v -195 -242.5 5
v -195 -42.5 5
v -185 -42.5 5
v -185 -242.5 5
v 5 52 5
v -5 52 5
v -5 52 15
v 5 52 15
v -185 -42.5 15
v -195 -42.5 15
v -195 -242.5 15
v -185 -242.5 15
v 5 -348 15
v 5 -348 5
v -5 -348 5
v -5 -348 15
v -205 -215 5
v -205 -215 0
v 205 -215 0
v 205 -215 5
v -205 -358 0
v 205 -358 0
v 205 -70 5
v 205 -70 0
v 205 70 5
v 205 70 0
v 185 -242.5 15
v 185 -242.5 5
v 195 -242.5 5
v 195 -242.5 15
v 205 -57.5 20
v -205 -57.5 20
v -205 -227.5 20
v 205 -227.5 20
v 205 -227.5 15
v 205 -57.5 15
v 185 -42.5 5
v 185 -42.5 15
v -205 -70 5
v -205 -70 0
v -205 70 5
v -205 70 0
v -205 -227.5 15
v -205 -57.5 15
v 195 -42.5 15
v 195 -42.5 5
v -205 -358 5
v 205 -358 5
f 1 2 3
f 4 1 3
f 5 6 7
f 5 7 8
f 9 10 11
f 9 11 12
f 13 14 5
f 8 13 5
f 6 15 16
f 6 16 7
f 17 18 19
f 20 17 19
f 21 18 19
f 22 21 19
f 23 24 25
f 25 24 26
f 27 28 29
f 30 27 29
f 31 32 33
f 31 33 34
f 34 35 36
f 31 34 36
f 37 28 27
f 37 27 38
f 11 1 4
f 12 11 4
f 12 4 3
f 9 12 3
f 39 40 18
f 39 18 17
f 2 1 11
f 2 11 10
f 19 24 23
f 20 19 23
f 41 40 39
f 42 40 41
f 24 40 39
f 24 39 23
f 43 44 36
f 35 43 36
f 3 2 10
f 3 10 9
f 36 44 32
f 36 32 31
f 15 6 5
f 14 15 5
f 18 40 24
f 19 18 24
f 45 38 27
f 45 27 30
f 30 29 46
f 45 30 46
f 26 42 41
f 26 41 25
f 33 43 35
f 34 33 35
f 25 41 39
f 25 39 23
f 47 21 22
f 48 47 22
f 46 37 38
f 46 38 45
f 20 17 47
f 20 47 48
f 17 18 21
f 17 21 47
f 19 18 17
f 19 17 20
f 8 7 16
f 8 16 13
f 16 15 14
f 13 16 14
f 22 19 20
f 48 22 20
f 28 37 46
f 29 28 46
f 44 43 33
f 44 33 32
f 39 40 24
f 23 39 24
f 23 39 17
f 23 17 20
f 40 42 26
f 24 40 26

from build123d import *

# Parameters (mm, degrees)
F0_W     = 410
F0_H     = 140
F1_DEPTH = 5
F2_DEPTH = 145
F3_DEPTH = 143
F4_W     = 10
F4_H     = 400
F5_DEPTH = 10
F4_H_2   = 200
F6_W     = 410
F6_H     = 170
F7_DEPTH = 5


with BuildPart() as f1:
    # F0 (on Top) → F1 (new body)
    with BuildSketch(Plane.XY):
        Rectangle(F0_W, F0_H)
    extrude(amount=F1_DEPTH)


with BuildPart() as f2:
    # F2 (new): a face of the model
    f2_faces = [f1.part.faces().sort_by_distance(p)[0] for p in [
        (0, -70, 2.5),
    ]]
    extrude(f2_faces, amount=F2_DEPTH)


with BuildPart() as f3:
    # F3 (new): a face of the model
    f3_faces = [f2.part.faces().sort_by_distance(p)[0] for p in [
        (0, -215, 2.5),
    ]]
    extrude(f3_faces, amount=F3_DEPTH)


with BuildPart() as f5:
    # F4 (on face) → F5 (new body)
    with BuildSketch(Plane.XY.offset(5)):
        with Locations((0, -148)):
            Rectangle(F4_W, F4_H)
    extrude(amount=F5_DEPTH)


with BuildPart() as f5b:
    # F4 (on face) → F5, piece 2 (new body)
    with BuildSketch(Plane.XY.offset(5)):
        with Locations((190, -142.5)):
            Rectangle(F4_W, F4_H_2)
    extrude(amount=F5_DEPTH)


with BuildPart() as f5c:
    # F4 (on face) → F5, piece 3 (new body)
    with BuildSketch(Plane.XY.offset(5)):
        with Locations((-190, -142.5)):
            Rectangle(F4_W, F4_H_2)
    extrude(amount=F5_DEPTH)


with BuildPart() as f7:
    # F6 (on face) → F7 (new body)
    with BuildSketch(Plane.XY.offset(15)):
        with Locations((0, -142.5)):
            Rectangle(F6_W, F6_H)
    extrude(amount=F7_DEPTH)


solid = Compound([f1.part, f2.part, f3.part, f5.part, f5b.part, f5c.part, f7.part])
